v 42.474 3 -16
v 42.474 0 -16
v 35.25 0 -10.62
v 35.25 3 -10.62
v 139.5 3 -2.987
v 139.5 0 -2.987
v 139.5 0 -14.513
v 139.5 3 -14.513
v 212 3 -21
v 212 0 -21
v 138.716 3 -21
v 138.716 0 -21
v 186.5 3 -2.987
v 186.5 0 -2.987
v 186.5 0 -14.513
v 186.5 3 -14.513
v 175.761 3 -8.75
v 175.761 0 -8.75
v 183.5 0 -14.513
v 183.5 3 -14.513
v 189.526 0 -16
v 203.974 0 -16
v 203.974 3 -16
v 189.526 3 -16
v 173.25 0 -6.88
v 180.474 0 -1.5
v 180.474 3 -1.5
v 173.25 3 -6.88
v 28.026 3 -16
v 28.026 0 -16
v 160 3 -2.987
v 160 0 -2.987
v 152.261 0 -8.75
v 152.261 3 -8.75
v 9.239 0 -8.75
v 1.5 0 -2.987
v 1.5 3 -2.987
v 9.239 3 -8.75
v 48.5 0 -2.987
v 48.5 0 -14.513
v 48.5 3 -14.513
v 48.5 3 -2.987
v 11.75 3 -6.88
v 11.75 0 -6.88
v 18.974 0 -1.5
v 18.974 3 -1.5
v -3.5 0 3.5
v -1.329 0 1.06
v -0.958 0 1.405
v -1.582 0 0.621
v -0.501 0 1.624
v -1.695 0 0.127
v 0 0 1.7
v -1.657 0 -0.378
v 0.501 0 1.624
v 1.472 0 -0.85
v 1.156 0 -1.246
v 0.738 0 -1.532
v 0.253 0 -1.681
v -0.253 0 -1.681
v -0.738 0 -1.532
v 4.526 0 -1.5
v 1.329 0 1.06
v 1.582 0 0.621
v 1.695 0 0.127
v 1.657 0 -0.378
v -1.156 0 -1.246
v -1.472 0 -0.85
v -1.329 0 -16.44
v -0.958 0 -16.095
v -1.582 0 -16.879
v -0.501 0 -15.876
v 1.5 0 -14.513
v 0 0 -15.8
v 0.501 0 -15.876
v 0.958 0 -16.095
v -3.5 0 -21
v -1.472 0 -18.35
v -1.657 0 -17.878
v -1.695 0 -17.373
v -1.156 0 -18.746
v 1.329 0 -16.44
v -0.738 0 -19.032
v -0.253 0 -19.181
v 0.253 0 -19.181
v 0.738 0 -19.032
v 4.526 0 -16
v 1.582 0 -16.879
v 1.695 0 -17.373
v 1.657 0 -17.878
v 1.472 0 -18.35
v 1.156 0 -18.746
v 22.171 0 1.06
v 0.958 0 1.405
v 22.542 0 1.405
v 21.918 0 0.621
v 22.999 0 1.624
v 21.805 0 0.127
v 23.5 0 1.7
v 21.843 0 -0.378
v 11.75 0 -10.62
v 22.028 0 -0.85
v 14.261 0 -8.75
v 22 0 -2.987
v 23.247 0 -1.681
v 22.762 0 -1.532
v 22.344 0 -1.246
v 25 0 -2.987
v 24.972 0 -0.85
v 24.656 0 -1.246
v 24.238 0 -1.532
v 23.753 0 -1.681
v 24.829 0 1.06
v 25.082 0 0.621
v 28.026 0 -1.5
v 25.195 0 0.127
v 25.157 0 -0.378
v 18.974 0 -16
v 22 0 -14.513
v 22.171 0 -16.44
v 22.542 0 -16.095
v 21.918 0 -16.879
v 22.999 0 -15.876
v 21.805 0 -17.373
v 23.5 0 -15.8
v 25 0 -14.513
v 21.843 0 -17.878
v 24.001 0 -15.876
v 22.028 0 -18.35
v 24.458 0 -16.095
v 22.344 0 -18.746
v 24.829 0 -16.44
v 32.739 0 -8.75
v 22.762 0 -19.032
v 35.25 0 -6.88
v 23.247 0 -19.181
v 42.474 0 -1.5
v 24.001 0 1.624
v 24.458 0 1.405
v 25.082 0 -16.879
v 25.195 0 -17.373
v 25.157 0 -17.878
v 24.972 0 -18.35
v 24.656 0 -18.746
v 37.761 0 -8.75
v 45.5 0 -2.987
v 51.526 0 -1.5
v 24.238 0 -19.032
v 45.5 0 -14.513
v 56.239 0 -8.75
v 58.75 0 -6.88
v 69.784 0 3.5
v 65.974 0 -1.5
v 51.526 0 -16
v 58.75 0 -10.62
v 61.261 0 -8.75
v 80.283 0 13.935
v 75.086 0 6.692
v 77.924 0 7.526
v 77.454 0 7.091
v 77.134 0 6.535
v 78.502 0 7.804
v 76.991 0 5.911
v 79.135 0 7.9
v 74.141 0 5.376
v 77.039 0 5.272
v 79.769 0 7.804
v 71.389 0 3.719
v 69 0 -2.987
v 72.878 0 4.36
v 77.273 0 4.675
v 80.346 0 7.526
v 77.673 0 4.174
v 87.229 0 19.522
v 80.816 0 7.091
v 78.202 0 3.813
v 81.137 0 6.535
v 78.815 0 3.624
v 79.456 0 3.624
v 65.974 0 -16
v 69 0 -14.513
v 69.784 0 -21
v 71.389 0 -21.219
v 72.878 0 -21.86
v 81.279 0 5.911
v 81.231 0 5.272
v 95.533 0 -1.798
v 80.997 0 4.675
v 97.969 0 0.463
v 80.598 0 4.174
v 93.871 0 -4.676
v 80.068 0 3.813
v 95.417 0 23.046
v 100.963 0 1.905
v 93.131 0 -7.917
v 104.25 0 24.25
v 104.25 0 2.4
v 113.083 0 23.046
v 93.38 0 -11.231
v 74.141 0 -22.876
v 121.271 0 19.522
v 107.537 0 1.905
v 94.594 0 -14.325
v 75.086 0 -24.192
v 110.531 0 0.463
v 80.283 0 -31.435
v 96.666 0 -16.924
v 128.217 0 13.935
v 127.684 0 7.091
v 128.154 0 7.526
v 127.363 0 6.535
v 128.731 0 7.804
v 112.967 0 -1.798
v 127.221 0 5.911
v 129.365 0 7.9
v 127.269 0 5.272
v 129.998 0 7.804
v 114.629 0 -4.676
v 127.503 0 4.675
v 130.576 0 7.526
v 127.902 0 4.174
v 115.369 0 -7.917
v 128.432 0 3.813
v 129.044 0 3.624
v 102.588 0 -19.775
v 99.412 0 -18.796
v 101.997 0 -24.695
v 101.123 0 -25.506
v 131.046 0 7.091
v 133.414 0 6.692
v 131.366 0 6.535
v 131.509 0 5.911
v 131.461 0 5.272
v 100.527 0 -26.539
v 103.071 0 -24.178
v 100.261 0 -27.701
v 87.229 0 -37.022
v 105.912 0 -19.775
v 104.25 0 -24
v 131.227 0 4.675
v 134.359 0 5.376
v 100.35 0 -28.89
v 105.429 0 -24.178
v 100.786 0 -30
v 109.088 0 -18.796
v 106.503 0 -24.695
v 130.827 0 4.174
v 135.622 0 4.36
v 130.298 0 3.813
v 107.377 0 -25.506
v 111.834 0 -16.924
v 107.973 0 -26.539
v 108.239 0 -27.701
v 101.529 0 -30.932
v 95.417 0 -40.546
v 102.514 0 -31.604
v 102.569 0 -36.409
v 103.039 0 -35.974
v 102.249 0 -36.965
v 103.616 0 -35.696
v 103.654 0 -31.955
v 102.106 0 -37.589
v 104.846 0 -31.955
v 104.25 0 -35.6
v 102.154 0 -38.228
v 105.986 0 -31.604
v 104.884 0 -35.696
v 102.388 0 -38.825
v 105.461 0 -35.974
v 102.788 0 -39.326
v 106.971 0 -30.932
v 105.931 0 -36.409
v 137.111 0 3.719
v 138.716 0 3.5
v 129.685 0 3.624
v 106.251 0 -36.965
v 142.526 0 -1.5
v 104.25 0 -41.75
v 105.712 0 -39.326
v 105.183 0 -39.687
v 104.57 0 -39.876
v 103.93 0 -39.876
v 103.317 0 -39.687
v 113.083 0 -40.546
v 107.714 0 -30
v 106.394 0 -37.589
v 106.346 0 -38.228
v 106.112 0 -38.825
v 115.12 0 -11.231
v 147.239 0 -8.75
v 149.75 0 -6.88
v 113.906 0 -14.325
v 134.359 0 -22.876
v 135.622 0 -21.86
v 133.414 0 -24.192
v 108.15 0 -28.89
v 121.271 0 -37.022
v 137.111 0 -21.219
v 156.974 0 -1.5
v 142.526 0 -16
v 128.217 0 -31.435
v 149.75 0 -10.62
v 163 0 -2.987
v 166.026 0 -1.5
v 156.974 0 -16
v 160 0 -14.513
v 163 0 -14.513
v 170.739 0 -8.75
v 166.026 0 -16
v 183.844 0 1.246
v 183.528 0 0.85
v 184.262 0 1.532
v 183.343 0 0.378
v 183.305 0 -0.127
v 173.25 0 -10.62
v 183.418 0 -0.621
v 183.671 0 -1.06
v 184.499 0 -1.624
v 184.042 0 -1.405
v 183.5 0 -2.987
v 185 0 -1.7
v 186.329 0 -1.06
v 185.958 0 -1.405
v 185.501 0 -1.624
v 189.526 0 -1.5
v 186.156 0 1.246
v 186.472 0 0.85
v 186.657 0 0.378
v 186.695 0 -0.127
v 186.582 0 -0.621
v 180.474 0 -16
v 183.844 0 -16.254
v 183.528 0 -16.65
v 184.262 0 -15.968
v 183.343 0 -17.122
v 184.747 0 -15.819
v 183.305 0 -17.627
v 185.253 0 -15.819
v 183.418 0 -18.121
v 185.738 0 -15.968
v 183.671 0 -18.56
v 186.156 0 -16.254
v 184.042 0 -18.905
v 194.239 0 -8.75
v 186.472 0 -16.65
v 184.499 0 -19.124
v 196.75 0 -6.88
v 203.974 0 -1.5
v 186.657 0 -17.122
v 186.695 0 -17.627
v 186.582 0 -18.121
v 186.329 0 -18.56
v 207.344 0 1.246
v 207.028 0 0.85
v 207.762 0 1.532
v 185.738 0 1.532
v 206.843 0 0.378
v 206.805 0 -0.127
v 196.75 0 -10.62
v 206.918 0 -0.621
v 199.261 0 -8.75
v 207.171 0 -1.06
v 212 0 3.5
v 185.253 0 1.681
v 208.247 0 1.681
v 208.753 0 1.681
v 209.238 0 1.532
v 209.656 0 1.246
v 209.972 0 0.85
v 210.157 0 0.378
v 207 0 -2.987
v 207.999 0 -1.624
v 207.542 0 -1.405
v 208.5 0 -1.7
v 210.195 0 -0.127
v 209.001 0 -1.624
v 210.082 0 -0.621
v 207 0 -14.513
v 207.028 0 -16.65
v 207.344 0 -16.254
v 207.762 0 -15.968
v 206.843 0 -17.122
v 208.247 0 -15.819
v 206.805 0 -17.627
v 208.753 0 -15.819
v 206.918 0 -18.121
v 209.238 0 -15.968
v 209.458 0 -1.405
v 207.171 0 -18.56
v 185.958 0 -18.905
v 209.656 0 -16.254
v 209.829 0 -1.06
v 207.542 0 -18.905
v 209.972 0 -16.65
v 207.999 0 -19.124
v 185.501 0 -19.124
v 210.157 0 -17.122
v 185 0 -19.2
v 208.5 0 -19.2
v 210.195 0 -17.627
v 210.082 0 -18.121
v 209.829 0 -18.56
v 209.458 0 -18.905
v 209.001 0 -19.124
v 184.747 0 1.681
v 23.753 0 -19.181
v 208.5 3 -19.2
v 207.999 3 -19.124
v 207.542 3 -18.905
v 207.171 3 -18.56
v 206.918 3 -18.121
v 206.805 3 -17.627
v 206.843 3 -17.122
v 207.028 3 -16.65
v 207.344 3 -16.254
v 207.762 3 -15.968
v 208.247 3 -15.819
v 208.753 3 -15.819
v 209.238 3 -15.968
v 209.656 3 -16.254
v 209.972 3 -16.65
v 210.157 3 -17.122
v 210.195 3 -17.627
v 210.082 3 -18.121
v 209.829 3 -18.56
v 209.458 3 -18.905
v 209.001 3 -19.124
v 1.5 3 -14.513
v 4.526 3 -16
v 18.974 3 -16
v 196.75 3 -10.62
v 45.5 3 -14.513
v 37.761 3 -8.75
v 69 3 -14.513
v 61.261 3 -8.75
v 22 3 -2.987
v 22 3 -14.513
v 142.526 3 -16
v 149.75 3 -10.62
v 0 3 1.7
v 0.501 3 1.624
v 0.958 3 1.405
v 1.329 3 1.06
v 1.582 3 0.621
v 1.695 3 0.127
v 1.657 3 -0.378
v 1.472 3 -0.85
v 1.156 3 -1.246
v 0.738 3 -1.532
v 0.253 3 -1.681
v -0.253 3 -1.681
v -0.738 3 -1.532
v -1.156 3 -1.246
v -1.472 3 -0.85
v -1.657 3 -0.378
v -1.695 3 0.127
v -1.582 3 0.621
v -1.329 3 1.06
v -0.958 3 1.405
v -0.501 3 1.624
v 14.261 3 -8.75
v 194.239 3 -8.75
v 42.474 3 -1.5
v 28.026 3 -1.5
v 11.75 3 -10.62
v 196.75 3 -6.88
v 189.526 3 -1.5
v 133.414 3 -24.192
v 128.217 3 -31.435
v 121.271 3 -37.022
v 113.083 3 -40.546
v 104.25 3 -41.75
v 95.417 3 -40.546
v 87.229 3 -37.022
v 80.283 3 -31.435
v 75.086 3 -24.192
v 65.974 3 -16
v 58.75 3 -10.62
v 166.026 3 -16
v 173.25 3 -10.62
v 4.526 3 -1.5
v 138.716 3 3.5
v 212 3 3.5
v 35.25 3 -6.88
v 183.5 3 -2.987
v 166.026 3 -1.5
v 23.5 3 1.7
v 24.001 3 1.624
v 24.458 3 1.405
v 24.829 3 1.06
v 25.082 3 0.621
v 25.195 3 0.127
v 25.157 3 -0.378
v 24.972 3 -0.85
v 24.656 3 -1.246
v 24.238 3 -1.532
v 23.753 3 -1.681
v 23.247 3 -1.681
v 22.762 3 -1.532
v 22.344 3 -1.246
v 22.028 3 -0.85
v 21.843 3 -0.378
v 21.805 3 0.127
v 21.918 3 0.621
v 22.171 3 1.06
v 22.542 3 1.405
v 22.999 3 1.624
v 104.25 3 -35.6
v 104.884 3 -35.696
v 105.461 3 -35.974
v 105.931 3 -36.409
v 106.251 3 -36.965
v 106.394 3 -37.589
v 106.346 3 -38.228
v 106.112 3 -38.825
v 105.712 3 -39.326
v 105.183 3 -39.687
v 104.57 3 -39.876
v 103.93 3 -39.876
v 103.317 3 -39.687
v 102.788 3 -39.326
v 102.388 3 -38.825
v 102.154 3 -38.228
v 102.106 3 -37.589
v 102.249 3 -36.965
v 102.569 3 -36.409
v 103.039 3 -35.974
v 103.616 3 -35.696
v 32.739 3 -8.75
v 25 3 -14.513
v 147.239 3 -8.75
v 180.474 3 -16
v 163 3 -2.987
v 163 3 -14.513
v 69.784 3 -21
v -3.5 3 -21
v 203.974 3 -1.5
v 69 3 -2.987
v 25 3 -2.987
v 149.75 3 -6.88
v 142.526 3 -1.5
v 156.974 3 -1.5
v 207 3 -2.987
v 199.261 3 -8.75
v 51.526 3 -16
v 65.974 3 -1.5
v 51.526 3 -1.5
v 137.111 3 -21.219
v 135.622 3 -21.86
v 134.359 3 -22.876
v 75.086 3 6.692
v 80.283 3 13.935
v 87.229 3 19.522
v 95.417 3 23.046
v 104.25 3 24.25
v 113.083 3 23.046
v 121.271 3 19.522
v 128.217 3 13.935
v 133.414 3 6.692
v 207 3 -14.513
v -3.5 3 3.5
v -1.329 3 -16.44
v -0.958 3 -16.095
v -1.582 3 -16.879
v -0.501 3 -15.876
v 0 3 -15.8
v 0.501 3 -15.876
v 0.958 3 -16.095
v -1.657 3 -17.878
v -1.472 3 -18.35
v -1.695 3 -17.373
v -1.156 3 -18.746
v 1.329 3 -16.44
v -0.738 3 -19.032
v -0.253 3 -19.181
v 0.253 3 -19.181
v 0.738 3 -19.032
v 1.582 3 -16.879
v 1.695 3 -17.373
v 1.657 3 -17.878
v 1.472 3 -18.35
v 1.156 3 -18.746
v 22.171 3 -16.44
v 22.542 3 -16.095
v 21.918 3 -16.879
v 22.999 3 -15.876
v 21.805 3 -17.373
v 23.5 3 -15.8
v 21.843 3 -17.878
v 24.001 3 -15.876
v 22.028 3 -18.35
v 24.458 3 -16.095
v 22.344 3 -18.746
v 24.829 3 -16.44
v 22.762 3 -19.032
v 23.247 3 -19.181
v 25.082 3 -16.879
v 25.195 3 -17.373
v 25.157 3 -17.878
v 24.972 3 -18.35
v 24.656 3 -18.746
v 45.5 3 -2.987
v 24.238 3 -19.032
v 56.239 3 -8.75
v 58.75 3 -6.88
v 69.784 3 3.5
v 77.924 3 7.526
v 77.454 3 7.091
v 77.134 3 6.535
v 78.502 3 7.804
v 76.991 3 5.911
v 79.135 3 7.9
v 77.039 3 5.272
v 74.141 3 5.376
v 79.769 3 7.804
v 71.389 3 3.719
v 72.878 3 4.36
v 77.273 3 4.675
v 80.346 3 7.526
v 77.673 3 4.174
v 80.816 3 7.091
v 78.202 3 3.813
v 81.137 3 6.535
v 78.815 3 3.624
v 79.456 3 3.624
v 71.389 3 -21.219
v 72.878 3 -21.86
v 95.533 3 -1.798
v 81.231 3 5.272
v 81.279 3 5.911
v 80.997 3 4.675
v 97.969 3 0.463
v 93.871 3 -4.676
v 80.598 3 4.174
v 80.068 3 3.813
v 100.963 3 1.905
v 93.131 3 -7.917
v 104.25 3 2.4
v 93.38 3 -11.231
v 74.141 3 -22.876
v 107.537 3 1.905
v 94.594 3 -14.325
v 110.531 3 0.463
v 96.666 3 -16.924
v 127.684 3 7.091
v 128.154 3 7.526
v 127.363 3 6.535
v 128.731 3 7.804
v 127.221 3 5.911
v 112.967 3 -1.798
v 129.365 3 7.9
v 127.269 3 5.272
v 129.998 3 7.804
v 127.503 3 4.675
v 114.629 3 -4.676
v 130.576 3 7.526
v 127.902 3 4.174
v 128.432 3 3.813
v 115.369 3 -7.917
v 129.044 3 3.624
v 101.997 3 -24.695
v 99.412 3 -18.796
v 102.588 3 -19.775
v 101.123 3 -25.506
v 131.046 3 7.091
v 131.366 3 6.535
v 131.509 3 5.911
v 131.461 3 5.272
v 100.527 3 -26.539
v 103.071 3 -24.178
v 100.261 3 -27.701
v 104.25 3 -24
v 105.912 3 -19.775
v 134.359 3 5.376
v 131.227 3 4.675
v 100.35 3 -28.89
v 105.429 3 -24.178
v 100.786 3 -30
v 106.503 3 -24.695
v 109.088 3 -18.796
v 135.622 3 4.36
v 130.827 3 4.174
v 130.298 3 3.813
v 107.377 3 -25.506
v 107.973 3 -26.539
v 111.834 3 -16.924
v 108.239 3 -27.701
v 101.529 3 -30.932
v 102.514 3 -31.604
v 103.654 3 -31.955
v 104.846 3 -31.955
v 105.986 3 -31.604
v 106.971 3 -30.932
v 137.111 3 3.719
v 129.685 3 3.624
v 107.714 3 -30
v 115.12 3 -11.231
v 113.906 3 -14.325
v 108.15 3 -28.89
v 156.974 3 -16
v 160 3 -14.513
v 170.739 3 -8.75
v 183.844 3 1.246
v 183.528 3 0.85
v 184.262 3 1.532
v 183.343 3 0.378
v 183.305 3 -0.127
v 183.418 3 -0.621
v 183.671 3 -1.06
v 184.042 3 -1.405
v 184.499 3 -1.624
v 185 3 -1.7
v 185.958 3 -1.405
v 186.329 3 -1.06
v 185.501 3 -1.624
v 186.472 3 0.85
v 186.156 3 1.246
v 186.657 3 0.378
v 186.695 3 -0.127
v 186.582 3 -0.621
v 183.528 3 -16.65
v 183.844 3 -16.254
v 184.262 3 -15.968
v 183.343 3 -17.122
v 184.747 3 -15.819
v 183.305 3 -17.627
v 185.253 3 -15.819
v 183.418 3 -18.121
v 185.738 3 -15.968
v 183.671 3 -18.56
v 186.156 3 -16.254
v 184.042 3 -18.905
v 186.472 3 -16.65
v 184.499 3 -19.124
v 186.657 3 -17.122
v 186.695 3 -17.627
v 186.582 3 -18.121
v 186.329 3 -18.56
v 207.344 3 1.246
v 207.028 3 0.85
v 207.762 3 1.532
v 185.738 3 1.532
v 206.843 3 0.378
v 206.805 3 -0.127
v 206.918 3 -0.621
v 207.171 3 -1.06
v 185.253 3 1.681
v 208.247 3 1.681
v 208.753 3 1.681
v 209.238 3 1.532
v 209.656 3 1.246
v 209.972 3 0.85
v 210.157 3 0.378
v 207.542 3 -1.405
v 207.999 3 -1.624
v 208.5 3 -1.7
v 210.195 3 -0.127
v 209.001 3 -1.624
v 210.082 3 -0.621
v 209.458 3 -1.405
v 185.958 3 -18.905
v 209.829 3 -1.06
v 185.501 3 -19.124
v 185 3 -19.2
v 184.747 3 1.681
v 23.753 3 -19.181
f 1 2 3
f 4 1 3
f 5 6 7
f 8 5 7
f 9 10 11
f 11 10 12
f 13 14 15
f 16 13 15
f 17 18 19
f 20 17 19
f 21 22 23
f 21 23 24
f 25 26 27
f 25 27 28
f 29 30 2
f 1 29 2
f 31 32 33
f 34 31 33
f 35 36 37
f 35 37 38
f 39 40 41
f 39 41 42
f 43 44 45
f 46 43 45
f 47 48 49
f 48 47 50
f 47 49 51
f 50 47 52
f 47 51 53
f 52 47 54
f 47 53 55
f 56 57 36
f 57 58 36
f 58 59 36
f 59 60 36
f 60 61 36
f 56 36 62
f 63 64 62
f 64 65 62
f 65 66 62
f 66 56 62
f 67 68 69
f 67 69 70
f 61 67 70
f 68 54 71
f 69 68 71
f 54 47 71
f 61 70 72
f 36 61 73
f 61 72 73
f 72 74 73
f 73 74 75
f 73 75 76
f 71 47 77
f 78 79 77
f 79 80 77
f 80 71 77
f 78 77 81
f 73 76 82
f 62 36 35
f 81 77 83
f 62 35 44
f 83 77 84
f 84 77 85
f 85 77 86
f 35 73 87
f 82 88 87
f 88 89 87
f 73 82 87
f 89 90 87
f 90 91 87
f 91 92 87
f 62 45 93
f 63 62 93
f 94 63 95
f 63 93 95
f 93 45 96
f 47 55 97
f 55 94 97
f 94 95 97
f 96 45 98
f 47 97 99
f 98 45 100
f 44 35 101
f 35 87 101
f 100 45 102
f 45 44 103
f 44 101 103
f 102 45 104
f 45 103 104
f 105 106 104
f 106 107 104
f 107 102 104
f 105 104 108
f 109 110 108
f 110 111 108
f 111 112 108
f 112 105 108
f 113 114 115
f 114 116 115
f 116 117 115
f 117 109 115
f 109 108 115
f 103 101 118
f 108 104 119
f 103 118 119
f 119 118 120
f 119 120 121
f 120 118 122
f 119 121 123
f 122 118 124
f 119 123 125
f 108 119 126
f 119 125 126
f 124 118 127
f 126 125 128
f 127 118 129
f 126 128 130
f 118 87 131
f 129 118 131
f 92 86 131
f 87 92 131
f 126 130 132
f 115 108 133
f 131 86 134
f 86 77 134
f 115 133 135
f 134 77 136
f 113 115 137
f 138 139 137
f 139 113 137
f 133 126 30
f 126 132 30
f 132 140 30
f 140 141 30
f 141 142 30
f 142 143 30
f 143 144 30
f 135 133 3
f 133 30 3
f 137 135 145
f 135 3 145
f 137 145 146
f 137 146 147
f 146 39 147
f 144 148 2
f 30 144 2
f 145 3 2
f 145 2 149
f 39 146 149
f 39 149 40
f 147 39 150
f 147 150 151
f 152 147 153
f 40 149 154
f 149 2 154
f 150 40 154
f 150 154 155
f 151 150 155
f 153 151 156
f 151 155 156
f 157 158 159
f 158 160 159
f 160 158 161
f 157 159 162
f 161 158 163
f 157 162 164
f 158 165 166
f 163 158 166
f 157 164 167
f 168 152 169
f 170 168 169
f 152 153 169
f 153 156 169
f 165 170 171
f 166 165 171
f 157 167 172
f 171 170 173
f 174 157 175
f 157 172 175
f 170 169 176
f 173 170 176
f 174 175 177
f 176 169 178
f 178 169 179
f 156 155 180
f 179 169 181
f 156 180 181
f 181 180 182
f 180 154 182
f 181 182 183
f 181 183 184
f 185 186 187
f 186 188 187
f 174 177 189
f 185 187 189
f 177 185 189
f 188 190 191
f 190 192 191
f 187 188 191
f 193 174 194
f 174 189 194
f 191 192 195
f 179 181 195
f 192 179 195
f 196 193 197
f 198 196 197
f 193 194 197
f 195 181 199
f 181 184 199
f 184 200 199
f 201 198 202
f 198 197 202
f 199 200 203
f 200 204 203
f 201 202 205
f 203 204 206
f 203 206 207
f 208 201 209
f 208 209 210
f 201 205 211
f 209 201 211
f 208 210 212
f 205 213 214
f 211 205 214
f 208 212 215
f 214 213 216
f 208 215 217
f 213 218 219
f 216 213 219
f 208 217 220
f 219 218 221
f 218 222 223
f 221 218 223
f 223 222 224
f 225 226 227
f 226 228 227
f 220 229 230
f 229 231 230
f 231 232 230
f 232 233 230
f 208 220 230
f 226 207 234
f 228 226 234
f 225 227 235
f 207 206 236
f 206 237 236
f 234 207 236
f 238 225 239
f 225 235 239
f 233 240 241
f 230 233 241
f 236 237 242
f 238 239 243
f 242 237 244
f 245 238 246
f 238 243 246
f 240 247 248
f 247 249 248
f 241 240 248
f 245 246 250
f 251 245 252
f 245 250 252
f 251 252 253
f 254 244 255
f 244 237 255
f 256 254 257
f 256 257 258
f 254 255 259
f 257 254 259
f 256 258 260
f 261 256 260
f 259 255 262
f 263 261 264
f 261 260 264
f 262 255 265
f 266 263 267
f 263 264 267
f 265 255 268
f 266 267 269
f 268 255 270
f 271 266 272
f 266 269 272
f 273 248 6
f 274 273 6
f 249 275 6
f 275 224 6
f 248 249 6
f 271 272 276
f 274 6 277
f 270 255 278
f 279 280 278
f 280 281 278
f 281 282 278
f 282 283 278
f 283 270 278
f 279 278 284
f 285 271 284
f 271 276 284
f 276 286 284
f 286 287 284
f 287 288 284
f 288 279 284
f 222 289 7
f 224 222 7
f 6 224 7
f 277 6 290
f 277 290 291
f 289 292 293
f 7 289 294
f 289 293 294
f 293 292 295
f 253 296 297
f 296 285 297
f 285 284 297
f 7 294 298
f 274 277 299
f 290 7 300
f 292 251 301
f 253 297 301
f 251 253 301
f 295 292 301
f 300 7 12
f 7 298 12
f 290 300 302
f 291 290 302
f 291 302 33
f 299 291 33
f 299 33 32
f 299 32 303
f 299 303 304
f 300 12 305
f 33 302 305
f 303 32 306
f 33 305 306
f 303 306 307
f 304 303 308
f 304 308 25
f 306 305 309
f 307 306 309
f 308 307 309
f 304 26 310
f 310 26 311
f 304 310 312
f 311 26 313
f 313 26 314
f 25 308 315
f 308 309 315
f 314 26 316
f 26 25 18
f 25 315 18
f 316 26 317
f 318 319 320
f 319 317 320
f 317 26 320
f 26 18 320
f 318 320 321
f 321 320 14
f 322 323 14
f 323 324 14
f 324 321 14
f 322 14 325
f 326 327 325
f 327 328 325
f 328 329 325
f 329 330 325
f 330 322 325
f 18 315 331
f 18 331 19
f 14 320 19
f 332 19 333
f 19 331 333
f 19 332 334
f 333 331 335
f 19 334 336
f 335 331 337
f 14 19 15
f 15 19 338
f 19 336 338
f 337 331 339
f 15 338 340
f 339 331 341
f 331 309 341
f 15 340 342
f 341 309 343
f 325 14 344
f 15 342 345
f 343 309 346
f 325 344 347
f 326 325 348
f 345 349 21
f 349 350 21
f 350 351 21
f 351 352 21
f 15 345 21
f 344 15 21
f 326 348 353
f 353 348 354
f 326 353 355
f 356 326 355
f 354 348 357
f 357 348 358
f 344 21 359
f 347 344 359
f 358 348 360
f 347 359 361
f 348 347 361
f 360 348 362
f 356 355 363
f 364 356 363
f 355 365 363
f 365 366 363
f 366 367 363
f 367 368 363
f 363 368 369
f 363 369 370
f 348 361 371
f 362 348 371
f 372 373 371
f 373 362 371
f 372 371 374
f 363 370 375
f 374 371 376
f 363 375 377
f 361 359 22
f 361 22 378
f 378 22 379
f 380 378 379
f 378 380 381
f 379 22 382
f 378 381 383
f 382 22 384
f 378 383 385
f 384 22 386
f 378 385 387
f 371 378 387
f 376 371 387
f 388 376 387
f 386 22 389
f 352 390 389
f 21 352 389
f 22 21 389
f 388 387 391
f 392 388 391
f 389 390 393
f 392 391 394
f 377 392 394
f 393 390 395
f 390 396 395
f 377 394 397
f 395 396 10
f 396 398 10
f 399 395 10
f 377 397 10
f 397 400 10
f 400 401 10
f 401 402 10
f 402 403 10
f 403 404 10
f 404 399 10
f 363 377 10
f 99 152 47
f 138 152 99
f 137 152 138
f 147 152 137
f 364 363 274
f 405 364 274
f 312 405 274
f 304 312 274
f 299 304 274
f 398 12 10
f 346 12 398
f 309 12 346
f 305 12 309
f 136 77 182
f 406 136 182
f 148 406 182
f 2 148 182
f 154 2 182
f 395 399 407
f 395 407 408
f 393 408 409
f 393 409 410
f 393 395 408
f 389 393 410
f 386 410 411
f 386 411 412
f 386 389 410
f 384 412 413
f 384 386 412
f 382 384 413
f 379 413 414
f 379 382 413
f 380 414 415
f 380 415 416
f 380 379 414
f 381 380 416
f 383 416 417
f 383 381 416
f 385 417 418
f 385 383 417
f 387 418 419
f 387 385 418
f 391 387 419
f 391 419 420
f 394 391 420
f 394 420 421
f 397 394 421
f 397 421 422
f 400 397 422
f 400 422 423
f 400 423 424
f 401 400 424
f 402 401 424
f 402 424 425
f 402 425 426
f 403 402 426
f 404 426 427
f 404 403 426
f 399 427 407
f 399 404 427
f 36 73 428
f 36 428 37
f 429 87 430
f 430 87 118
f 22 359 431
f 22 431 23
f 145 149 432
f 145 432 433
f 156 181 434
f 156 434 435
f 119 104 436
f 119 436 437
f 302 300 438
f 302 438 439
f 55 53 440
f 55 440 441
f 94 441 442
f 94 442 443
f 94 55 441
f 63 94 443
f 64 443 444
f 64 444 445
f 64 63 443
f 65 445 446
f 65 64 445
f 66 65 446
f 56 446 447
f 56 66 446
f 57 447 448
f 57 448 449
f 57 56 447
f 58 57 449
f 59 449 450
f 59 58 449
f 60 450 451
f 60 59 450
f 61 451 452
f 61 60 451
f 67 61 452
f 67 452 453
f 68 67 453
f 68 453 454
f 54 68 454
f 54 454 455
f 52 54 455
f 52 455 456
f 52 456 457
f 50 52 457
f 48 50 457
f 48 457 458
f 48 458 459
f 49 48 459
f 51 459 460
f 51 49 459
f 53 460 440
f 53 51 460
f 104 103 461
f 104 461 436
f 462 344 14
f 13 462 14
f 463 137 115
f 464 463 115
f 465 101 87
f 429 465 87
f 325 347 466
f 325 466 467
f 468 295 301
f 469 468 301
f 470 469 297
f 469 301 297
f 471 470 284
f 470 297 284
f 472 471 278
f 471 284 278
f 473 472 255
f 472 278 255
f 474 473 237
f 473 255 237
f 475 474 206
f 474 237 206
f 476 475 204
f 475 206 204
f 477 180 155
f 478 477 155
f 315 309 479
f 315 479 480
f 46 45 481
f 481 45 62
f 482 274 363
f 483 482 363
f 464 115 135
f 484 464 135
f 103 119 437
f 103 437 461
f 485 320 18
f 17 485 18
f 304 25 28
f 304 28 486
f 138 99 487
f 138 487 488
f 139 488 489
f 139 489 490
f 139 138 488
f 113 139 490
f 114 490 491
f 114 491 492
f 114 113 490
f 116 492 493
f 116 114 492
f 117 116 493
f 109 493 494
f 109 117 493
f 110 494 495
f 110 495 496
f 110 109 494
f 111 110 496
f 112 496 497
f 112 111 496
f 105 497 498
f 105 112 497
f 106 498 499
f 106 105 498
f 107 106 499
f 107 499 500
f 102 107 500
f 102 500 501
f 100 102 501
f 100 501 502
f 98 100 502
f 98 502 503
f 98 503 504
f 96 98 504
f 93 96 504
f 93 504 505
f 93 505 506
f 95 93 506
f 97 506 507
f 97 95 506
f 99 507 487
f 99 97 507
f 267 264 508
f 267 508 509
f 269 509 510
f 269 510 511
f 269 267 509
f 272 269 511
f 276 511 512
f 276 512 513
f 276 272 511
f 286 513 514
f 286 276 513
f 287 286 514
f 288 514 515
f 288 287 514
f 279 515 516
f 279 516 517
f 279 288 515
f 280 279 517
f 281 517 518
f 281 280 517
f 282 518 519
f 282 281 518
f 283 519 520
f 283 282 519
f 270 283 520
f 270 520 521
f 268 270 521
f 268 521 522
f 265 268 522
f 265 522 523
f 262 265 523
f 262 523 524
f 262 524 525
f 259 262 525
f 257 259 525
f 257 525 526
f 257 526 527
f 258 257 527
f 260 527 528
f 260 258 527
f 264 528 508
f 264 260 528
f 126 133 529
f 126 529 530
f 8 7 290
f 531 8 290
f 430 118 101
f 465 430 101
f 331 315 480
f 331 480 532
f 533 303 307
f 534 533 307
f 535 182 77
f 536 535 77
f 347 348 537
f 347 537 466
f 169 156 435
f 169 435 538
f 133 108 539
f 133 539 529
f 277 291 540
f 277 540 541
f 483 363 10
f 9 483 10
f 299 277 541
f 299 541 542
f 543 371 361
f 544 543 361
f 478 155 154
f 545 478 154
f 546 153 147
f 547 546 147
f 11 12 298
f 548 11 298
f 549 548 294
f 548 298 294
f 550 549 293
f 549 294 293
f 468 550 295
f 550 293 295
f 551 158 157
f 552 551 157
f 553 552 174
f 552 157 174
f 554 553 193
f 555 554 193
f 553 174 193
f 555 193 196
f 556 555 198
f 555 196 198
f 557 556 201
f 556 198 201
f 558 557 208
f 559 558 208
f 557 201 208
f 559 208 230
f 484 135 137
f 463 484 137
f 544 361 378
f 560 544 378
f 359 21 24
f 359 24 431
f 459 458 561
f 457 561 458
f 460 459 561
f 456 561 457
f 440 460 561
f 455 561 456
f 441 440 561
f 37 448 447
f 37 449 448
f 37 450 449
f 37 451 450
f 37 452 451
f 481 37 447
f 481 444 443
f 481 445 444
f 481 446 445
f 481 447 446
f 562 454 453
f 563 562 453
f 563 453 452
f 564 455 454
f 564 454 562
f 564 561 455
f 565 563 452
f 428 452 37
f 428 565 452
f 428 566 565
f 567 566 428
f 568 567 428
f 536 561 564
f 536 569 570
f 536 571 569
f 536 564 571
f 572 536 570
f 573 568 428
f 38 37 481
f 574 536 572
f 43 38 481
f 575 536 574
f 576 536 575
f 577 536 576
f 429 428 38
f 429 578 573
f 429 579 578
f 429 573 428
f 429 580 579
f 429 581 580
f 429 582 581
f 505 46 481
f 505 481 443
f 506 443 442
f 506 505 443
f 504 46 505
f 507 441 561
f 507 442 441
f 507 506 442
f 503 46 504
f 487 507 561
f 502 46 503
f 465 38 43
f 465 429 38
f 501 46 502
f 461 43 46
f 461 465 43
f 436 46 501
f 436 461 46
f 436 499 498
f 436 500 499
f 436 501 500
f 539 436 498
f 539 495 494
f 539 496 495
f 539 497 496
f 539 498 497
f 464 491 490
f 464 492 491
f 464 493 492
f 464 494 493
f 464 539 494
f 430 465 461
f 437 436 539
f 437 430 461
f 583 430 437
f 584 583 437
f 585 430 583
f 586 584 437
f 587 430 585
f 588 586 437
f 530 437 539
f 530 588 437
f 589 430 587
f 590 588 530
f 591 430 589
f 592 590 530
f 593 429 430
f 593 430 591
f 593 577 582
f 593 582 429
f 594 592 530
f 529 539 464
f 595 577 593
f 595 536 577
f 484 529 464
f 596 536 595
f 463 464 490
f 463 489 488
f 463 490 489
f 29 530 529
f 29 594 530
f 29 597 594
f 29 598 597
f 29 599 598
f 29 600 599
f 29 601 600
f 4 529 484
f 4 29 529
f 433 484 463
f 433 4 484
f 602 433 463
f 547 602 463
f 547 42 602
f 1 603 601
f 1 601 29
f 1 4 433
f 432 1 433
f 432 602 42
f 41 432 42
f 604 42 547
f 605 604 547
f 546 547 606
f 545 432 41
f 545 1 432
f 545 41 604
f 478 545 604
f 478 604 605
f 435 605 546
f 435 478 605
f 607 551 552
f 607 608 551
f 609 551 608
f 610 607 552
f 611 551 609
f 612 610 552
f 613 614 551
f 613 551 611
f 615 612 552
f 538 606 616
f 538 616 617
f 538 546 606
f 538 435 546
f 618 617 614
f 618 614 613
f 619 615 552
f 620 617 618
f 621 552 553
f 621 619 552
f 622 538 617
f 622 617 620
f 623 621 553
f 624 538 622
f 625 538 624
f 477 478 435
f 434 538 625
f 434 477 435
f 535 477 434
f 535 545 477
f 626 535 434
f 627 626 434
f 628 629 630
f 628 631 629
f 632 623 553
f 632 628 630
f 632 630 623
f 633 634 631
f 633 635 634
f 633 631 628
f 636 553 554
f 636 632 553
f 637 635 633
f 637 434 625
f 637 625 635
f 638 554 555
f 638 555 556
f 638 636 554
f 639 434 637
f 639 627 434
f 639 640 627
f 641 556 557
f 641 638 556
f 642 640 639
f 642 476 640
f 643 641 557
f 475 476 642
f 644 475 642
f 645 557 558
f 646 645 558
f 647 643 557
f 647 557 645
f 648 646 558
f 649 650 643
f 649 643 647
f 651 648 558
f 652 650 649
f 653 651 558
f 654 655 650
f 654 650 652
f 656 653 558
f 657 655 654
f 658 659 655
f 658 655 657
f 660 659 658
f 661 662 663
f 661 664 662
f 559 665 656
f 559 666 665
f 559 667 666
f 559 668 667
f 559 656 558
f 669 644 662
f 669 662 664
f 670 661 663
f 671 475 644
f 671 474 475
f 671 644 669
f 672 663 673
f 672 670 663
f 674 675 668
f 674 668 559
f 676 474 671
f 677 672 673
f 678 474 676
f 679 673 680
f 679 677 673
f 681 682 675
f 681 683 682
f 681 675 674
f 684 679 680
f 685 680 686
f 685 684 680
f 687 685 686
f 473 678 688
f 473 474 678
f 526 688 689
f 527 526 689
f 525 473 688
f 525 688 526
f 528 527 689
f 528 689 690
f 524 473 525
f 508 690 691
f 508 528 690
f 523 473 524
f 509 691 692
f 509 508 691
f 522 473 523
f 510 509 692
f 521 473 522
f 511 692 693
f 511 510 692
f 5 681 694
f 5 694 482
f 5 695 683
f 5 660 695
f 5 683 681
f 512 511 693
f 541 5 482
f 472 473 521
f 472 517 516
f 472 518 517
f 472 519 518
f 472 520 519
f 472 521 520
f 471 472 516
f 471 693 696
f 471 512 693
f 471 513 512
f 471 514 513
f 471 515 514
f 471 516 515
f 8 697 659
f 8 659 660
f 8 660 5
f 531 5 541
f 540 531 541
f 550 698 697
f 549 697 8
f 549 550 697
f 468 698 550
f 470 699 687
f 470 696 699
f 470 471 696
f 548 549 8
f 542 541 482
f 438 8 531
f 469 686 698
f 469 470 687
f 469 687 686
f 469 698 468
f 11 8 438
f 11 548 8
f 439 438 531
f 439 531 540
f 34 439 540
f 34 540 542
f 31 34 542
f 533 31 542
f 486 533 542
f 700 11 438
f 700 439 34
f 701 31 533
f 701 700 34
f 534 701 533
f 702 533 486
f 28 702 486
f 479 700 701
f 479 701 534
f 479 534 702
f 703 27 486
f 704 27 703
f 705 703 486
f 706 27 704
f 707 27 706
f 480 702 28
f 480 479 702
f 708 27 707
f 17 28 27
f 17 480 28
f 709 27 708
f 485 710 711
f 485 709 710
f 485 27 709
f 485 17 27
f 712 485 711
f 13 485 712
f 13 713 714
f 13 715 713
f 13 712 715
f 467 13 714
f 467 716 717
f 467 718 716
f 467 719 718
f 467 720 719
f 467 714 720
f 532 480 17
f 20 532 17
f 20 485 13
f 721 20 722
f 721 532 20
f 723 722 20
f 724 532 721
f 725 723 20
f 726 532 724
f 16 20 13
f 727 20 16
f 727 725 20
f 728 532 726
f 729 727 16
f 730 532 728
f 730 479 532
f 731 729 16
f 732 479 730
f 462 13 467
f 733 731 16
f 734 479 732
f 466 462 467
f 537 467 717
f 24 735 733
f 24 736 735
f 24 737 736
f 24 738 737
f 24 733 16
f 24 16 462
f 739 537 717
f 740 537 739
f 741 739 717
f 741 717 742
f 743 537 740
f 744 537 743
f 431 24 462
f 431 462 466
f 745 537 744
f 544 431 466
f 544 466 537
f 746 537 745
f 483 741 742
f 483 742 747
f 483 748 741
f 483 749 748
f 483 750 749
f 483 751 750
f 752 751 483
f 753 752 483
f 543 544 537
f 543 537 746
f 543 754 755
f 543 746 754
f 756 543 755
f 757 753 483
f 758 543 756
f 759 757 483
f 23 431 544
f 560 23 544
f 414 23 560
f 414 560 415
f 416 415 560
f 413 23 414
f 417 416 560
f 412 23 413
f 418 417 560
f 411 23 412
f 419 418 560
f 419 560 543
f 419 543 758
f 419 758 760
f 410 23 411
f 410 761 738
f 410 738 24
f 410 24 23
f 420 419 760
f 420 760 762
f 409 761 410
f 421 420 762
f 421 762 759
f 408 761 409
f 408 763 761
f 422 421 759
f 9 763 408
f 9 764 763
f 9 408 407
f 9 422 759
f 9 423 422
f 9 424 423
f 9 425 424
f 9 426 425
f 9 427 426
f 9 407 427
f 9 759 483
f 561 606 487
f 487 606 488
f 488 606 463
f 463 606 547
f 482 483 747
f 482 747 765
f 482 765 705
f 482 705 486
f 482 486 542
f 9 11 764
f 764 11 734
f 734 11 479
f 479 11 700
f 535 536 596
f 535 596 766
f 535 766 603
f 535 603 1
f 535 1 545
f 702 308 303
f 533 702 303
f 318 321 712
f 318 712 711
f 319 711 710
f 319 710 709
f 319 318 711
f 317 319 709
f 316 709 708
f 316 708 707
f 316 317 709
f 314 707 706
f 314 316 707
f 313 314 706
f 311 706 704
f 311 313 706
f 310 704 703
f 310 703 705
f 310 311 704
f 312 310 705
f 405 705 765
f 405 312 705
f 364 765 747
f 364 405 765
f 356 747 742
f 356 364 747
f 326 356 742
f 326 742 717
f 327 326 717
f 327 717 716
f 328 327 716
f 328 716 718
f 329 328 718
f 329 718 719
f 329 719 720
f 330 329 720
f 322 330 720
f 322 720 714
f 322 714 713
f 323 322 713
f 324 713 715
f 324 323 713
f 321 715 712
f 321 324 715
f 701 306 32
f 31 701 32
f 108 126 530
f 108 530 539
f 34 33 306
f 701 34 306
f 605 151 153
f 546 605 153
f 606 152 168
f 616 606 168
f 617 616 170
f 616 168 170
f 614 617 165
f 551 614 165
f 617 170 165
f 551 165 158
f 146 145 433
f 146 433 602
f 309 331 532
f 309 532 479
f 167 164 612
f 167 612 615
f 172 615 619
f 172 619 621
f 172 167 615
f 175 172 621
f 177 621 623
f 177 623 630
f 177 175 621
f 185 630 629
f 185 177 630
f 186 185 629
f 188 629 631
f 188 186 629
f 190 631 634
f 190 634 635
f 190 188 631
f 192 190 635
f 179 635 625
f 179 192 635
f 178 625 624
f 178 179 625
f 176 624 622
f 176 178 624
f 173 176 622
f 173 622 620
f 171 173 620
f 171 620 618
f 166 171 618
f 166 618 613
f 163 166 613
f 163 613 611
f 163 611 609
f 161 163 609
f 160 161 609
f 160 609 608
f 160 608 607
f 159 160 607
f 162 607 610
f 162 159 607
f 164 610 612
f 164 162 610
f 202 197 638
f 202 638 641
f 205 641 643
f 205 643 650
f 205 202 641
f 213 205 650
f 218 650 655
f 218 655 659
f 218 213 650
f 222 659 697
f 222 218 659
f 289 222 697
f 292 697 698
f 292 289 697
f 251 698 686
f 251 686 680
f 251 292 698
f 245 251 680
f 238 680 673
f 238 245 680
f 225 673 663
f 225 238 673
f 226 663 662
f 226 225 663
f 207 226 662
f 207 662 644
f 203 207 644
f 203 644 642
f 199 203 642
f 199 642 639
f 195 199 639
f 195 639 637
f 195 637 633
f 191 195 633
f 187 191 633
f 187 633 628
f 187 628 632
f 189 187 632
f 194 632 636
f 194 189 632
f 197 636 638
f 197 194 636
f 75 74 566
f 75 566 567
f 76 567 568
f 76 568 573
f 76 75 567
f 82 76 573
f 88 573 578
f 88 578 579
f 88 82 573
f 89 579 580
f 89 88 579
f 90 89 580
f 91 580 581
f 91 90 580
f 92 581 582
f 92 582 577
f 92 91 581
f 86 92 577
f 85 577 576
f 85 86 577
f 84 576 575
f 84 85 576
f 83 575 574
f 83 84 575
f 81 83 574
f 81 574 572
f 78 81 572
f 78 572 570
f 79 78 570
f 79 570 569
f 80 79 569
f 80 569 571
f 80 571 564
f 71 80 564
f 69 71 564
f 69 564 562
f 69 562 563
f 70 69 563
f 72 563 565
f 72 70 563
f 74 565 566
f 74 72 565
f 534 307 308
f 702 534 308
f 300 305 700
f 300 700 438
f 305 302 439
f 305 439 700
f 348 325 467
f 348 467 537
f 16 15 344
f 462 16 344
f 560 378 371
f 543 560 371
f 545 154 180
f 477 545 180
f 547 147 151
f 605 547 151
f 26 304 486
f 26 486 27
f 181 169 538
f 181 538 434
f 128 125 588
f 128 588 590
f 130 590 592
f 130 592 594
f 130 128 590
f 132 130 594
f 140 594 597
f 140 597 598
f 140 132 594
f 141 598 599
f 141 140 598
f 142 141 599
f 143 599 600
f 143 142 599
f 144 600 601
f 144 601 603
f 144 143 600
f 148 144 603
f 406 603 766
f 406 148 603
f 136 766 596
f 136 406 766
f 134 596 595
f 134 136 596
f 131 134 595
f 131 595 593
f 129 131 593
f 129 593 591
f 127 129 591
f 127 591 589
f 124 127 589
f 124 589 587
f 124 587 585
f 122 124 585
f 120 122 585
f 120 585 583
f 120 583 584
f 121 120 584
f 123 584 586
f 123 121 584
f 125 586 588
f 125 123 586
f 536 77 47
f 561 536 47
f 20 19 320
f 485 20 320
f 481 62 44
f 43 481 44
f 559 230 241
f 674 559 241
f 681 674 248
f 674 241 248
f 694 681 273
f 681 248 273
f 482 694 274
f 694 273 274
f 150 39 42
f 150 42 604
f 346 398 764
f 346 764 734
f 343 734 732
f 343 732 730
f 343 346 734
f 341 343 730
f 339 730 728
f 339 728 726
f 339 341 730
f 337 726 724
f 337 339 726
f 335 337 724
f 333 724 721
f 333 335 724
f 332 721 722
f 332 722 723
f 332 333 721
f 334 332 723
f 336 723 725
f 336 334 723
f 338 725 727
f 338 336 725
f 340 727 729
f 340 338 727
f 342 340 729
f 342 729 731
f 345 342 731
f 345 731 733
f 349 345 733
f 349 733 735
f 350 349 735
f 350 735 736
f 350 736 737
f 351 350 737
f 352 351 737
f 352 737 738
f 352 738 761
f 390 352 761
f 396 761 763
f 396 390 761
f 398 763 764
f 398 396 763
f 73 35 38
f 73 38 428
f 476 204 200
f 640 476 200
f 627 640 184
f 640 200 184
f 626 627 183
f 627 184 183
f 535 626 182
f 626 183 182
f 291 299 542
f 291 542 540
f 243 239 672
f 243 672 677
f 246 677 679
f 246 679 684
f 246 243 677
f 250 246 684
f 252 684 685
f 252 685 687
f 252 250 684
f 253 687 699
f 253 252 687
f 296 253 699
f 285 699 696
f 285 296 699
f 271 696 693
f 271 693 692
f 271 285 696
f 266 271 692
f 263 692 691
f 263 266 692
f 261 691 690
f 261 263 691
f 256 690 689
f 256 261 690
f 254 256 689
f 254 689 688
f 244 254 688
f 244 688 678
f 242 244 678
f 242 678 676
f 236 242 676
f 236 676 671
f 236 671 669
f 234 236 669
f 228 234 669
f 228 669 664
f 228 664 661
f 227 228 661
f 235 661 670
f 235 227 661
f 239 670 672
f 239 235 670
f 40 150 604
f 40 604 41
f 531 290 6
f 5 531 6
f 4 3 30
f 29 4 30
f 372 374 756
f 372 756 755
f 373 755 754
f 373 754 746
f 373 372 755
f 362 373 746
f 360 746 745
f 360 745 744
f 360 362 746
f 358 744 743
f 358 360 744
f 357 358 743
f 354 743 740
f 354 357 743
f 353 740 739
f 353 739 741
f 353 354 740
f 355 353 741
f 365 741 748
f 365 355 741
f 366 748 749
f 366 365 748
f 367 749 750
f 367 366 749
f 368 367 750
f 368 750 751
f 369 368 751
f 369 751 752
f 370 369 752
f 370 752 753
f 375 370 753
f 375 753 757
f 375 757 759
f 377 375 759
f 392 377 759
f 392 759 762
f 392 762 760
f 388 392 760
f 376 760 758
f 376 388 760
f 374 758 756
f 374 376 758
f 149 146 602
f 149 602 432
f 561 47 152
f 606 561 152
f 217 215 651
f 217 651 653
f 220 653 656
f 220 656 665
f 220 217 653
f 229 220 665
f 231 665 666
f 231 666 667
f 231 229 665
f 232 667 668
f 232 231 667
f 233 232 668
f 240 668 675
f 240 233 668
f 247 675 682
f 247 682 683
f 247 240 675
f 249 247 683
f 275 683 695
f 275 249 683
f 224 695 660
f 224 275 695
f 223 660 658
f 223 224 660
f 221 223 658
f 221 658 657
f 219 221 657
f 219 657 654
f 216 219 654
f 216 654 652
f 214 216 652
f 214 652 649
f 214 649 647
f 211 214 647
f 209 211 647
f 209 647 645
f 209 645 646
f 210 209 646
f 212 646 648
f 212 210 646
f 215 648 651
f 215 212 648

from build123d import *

# Parameters (mm, degrees)
SKETCH_2_R      = 1.7
SKETCH_2_R_2    = 11.15
SKETCH_2_R_3    = 4
SKETCH_2_R_4    = 2.15
EXTRUDE_1_DEPTH = 3


with BuildPart() as part:
    # 草图2 → 凸台-拉伸1 (new body)
    with BuildSketch(Plane(origin=(0, 0, 0), x_dir=(1, 0, 0), z_dir=(0, 1, 0))):
        with BuildLine():
            Line((-3.5, -3.5), (69.783530787, -3.5))
            ThreePointArc((69.783530787, -3.5), (72.878191201, -4.359661789), (75.086064512, -6.692307692))
            ThreePointArc((75.086064512, -6.692307692), (104.25, -24.25), (133.413935488, -6.692307692))
            ThreePointArc((133.413935488, -6.692307692), (135.621808799, -4.359661789), (138.716469213, -3.5))
            Line((138.716469213, -3.5), (212, -3.5))
            Line((212, -3.5), (212, 21))
            Line((212, 21), (138.716469213, 21))
            ThreePointArc((138.716469213, 21), (135.621808799, 21.859661789), (133.413935488, 24.192307692))
            ThreePointArc((133.413935488, 24.192307692), (104.25, 41.75), (75.086064512, 24.192307692))
            ThreePointArc((75.086064512, 24.192307692), (72.878191201, 21.859661789), (69.783530787, 21))
            Line((69.783530787, 21), (-3.5, 21))
            Line((-3.5, 21), (-3.5, -3.5))
        make_face()
        with Locations(Location((0, 17.5, 0), (0, 0, 270))):
            Circle(SKETCH_2_R, mode=Mode.SUBTRACT)
        with Locations(Location((23.5, 17.5, 0), (0, 0, 270))):
            Circle(SKETCH_2_R, mode=Mode.SUBTRACT)
        with Locations(Location((0, 0, 0), (0, 0, 270))):
            Circle(SKETCH_2_R, mode=Mode.SUBTRACT)
        with Locations(Location((23.5, 0, 0), (0, 0, 270))):
            Circle(SKETCH_2_R, mode=Mode.SUBTRACT)
        with Locations(Location((104.25, 8.75, 0), (0, 0, 270))):
            Circle(SKETCH_2_R_2, mode=Mode.SUBTRACT)
        with Locations(Location((104.25, 28, 0), (0, 0, 270))):
            Circle(SKETCH_2_R_3, mode=Mode.SUBTRACT)
        with Locations(Location((104.25, 37.75, 0), (0, 0, 270))):
            Circle(SKETCH_2_R_4, mode=Mode.SUBTRACT)
        with Locations(Location((185, 0, 0), (0, 0, 90))):
            Circle(SKETCH_2_R, mode=Mode.SUBTRACT)
        with Locations(Location((208.5, 0, 0), (0, 0, 90))):
            Circle(SKETCH_2_R, mode=Mode.SUBTRACT)
        with Locations(Location((208.5, 17.5, 0), (0, 0, 90))):
            Circle(SKETCH_2_R, mode=Mode.SUBTRACT)
        with Locations(Location((185, 17.5, 0), (0, 0, 90))):
            Circle(SKETCH_2_R, mode=Mode.SUBTRACT)
        with Locations(Location((129.36473671, -5.75, 0), (0, 0, 270))):
            Circle(SKETCH_2_R_4, mode=Mode.SUBTRACT)
        with Locations(Location((79.13526329, -5.75, 0), (0, 0, 270))):
            Circle(SKETCH_2_R_4, mode=Mode.SUBTRACT)
        Polygon((4.525728913, 16), (18.974271087, 16), (11.75, 10.620223658), align=None, mode=Mode.SUBTRACT)
        Polygon((1.5, 14.512755065), (1.5, 2.987244935), (9.238556802, 8.75), align=None, mode=Mode.SUBTRACT)
        Polygon((189.525728913, 16), (196.75, 10.620223658), (203.974271087, 16), align=None, mode=Mode.SUBTRACT)
        Polygon((207, 2.987244935), (199.261443198, 8.75), (207, 14.512755065), align=None, mode=Mode.SUBTRACT)
        Polygon((14.261443198, 8.75), (22, 2.987244935), (22, 14.512755065), align=None, mode=Mode.SUBTRACT)
        Polygon((11.75, 6.879776342), (18.974271087, 1.5), (4.525728913, 1.5), align=None, mode=Mode.SUBTRACT)
        Polygon((42.474271087, 1.5), (28.025728913, 1.5), (35.25, 6.879776342), align=None, mode=Mode.SUBTRACT)
        Polygon((32.738556802, 8.75), (25, 14.512755065), (25, 2.987244935), align=None, mode=Mode.SUBTRACT)
        Polygon((35.25, 10.620223658), (28.025728913, 16), (42.474271087, 16), align=None, mode=Mode.SUBTRACT)
        Polygon((45.5, 14.512755065), (37.761443198, 8.75), (45.5, 2.987244935), align=None, mode=Mode.SUBTRACT)
        Polygon((51.525728913, 16), (65.974271087, 16), (58.75, 10.620223658), align=None, mode=Mode.SUBTRACT)
        Polygon((51.525728913, 1.5), (58.75, 6.879776342), (65.974271087, 1.5), align=None, mode=Mode.SUBTRACT)
        Polygon((61.261443198, 8.75), (69, 2.987244935), (69, 14.512755065), align=None, mode=Mode.SUBTRACT)
        Polygon((56.238556802, 8.75), (48.5, 14.512755065), (48.5, 2.987244935), align=None, mode=Mode.SUBTRACT)
        Polygon((142.525728913, 1.5), (156.974271087, 1.5), (149.75, 6.879776342), align=None, mode=Mode.SUBTRACT)
        Polygon((139.5, 14.512755065), (147.238556802, 8.75), (139.5, 2.987244935), align=None, mode=Mode.SUBTRACT)
        Polygon((149.75, 10.620223658), (156.974271087, 16), (142.525728913, 16), align=None, mode=Mode.SUBTRACT)
        Polygon((160, 2.987244935), (152.261443198, 8.75), (160, 14.512755065), align=None, mode=Mode.SUBTRACT)
        Polygon((173.25, 6.879776342), (166.025728913, 1.5), (180.474271087, 1.5), align=None, mode=Mode.SUBTRACT)
        Polygon((163, 2.987244935), (163, 14.512755065), (170.738556802, 8.75), align=None, mode=Mode.SUBTRACT)
        Polygon((166.025728913, 16), (173.25, 10.620223658), (180.474271087, 16), align=None, mode=Mode.SUBTRACT)
        Polygon((183.5, 2.987244935), (175.761443198, 8.75), (183.5, 14.512755065), align=None, mode=Mode.SUBTRACT)
        Polygon((186.5, 2.987244935), (186.5, 14.512755065), (194.238556802, 8.75), align=None, mode=Mode.SUBTRACT)
        Polygon((189.525728913, 1.5), (203.974271087, 1.5), (196.75, 6.879776342), align=None, mode=Mode.SUBTRACT)
    extrude(amount=EXTRUDE_1_DEPTH)


solid = part.part
